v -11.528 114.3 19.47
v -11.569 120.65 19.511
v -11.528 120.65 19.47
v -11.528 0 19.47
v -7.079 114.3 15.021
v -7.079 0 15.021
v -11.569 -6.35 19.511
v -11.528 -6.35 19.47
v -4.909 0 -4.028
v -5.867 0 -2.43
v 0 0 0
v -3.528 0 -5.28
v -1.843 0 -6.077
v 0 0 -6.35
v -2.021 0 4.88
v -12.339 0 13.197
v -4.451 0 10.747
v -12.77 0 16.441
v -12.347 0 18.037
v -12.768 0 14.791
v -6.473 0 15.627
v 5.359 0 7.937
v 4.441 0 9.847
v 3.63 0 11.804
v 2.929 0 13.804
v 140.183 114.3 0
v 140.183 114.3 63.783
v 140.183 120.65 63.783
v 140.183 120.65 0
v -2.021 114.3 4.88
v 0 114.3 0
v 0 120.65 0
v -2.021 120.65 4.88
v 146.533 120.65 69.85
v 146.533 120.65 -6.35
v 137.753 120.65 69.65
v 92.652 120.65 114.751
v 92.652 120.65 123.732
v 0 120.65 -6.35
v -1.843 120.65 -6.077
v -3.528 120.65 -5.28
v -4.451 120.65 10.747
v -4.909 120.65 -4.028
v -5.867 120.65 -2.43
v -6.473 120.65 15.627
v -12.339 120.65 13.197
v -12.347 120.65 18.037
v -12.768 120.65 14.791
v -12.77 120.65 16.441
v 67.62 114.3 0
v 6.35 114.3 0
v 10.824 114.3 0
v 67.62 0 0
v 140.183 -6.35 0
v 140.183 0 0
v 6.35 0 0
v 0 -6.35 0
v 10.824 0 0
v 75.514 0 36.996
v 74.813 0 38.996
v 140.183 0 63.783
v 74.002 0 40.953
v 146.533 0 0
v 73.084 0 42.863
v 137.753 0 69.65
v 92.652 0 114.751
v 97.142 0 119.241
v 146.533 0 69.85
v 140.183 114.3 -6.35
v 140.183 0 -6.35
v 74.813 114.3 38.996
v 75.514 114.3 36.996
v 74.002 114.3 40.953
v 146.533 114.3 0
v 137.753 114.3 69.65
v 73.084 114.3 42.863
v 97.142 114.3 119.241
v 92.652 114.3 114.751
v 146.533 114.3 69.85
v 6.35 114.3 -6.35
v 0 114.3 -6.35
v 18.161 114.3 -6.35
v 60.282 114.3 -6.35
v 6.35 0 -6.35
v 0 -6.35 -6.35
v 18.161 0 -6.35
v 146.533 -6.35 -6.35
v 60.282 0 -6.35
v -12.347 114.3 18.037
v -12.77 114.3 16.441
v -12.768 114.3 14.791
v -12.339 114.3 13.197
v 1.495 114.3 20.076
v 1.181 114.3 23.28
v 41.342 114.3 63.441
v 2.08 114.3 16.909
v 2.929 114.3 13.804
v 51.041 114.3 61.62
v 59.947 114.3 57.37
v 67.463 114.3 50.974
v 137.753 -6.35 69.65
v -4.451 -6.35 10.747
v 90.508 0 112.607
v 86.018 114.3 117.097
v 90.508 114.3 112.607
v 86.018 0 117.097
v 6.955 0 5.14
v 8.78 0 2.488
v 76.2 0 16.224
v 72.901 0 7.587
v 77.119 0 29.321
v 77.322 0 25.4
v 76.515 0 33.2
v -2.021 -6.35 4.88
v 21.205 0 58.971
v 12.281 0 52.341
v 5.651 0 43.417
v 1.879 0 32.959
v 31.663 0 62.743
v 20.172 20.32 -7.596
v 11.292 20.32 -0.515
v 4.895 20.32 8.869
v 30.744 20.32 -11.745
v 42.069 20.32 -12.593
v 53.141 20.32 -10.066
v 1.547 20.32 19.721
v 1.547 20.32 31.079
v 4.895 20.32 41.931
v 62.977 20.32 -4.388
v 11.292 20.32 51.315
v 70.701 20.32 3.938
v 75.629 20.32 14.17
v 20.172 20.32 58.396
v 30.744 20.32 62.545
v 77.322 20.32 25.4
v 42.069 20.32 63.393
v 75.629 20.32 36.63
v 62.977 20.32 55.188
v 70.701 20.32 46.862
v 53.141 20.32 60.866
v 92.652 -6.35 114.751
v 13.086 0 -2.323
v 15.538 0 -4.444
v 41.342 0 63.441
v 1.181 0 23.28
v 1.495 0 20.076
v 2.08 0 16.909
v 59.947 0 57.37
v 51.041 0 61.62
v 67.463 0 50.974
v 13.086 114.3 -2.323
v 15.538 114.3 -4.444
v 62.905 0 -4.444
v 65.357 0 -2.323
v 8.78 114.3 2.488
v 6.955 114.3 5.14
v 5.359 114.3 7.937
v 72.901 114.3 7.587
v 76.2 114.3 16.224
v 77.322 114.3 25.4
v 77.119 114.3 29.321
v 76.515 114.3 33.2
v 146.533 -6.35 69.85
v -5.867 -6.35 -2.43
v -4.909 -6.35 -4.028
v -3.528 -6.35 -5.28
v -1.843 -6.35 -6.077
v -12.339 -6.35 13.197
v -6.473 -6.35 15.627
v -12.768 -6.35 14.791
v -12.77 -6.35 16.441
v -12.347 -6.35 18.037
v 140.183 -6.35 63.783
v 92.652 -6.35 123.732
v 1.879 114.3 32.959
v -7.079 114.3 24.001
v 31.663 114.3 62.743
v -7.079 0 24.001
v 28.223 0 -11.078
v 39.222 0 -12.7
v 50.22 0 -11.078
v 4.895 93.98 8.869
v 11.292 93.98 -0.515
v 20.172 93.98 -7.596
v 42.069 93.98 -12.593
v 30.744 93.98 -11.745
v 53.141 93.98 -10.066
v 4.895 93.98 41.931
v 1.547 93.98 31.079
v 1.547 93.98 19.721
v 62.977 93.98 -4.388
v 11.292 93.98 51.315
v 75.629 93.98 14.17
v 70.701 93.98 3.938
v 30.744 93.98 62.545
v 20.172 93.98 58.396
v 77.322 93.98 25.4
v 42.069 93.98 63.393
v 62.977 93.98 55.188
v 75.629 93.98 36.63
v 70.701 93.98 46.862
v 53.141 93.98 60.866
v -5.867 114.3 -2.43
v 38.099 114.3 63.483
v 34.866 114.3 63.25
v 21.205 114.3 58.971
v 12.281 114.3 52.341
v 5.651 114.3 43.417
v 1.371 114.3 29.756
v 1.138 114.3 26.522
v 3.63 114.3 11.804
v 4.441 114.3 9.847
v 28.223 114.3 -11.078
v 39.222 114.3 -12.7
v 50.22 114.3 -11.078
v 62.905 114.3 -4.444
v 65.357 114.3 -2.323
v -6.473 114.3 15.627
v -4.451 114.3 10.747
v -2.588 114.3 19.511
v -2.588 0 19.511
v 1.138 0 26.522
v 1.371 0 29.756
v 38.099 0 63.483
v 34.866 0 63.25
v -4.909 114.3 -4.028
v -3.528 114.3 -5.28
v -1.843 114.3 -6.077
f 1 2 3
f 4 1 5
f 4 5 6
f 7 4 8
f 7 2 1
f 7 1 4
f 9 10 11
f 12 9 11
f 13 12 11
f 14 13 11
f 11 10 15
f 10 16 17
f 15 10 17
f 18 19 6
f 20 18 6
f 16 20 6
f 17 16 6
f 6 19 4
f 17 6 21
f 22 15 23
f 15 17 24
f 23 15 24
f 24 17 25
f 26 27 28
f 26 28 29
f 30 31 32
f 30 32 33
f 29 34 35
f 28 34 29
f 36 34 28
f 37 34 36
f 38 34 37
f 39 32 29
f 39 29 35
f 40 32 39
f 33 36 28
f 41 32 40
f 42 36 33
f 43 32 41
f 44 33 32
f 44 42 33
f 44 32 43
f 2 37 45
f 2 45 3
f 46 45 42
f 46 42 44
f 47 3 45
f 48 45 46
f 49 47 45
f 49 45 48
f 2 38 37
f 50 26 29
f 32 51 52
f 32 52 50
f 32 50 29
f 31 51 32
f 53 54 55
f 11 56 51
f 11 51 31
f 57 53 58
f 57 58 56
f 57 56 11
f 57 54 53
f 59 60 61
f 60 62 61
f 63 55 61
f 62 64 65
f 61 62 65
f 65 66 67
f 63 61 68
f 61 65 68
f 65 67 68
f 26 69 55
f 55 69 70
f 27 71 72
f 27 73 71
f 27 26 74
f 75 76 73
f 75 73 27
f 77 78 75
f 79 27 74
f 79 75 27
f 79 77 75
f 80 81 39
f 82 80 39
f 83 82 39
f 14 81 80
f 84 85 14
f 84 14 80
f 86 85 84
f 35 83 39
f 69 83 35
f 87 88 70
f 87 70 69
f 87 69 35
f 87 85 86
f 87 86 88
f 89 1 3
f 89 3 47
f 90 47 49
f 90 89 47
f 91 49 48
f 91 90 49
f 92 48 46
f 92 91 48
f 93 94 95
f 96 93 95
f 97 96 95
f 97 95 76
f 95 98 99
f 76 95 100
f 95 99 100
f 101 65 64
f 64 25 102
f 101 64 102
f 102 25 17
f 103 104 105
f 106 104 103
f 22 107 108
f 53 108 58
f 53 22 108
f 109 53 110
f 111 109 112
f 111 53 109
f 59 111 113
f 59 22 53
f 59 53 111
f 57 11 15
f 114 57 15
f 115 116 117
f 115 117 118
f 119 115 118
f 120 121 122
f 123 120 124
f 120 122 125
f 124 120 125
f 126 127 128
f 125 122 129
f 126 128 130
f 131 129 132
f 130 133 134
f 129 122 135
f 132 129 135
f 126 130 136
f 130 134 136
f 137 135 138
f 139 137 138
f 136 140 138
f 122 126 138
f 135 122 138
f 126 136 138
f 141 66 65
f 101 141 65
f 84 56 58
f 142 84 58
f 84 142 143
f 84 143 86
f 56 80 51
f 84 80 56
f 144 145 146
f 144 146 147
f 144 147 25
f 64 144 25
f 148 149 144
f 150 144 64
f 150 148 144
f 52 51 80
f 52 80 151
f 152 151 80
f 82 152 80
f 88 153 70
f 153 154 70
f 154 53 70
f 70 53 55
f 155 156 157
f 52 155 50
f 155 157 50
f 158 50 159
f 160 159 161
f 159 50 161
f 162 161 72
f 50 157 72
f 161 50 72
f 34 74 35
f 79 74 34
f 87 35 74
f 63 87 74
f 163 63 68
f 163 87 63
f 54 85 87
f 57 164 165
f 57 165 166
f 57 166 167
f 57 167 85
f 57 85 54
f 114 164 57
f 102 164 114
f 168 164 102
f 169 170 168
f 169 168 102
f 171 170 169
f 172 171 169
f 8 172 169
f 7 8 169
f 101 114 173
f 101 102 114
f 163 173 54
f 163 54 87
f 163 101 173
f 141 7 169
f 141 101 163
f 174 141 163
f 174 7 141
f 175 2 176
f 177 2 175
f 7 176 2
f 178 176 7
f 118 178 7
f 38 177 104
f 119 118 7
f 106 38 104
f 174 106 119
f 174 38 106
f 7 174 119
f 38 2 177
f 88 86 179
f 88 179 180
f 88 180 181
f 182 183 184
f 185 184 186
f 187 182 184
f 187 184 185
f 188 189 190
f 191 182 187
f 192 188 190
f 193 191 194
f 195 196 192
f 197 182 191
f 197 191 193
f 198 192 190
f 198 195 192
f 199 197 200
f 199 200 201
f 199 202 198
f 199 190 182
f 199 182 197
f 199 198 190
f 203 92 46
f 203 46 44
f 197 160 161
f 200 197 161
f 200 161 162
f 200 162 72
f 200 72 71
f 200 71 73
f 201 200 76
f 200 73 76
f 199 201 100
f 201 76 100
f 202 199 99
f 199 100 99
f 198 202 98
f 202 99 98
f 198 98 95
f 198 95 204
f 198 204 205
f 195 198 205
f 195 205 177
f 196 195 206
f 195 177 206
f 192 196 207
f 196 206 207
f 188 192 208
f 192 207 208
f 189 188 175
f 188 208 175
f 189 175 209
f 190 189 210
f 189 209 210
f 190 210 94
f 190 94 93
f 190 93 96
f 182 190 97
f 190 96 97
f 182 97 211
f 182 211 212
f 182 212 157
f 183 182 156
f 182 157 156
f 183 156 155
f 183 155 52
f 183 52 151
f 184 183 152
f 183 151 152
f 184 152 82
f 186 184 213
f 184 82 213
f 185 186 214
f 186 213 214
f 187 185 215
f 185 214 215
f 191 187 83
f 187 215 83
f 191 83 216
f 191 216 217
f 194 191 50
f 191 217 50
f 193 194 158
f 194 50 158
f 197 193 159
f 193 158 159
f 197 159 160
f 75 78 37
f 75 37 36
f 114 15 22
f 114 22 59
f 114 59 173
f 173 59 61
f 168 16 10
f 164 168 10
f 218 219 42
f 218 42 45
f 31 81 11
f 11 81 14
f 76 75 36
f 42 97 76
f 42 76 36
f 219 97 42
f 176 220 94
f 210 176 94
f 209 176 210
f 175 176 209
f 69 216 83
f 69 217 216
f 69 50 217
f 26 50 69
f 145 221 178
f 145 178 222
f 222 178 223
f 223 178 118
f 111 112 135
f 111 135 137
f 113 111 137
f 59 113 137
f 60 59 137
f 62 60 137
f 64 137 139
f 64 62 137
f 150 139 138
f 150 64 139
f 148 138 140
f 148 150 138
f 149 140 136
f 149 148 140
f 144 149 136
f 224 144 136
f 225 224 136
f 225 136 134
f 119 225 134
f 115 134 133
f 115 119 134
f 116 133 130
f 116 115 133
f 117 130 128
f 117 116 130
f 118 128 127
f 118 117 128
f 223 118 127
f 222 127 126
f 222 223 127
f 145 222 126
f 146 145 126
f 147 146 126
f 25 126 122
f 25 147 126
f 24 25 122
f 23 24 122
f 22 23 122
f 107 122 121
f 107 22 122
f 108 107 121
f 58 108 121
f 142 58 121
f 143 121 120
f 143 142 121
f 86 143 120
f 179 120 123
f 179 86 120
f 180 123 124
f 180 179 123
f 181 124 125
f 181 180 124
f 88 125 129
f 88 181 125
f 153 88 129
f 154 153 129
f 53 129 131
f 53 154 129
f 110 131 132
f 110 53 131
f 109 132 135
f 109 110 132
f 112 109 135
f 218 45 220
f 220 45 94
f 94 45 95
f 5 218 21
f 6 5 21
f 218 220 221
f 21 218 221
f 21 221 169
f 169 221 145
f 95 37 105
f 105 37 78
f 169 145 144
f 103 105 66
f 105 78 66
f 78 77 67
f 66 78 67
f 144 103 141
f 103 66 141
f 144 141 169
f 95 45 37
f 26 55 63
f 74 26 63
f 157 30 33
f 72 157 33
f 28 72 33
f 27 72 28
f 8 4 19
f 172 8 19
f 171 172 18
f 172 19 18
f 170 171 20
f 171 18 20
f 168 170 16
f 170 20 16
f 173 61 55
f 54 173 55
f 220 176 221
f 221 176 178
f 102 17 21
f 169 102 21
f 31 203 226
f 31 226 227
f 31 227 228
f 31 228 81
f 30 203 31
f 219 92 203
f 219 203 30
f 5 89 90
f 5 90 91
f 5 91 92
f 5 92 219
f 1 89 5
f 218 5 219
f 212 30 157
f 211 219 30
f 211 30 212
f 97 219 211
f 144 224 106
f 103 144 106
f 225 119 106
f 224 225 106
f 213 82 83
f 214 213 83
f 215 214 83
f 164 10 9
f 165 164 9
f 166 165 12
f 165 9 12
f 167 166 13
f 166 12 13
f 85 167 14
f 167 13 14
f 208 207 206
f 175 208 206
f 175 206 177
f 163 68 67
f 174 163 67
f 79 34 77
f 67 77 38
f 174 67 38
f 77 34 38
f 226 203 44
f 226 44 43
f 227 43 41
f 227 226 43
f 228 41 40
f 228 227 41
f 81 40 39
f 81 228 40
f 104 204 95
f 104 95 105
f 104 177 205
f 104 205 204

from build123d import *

# Parameters (mm, degrees)
F1_DEPTH = 6.35
F4_W     = 127
F4_H     = 147.3902405336
F4_W_2   = 114.3
F4_H_2   = 131.6580059171
F5_DEPTH = 6.35
F6_W     = 146.5334397942
F6_H     = 127
F6_W_2   = 133.8334397942
F6_H_2   = 114.3
F7_DEPTH = 6.35
F8_R     = 38.1
F9_DEPTH = 20.32


with BuildPart() as f1:
    # F0 (on Front) → F1 (new body)
    with BuildSketch(Plane.XZ):
        with BuildLine():
            Line((146.5334397942, -6.35), (146.5334397942, 69.85))
            Line((146.5334397942, 69.85), (92.6519030678, 123.7315367264))
            Line((92.6519030678, 123.7315367264), (-10.9628858813, 20.1167477774))
            ThreePointArc((-10.9628858813, 20.1167477774), (-12.7007443513, 16.8654432616), (-12.3393928522, 13.1965799213))
            Line((-12.3393928522, 13.1965799213), (-5.8666350314, -2.4300397955))
            ThreePointArc((-5.8666350314, -2.4300397955), (-3.5278709797, -5.2798320381), (0, -6.35))
            Line((0, -6.35), (146.5334397942, -6.35))
        make_face()
        Polygon((140.1834397942, 0), (0, 0), (-2.0213590126, 4.8799923427), (140.1834397942, 63.783148643), align=None, mode=Mode.SUBTRACT)
        Polygon((-4.4513988081, 10.7466273741), (-6.4727578208, 15.6266197168), (92.6519030678, 114.7512806053), (137.7533999987, 69.6497836744), align=None, mode=Mode.SUBTRACT)
    extrude(amount=F1_DEPTH)


with BuildPart() as f3_1:
    # F3: instance of F1
    add(f1.part.mirror(Plane.XZ.offset(-57.15)))


with BuildPart() as f1_1:
    add(f1.part)

    add(f3_1.part)  # F5 merges F3_1
    # F4 (on face) → F5 (join)
    with BuildSketch(Plane(origin=(-15.5398168293, 0, 15.5398168293), x_dir=(0, -1, 0), z_dir=(-0.7071067812, 0, 0.7071067812))):
        with Locations((-57.15, 79.3110773481)):
            Rectangle(F4_W, F4_H)
        with Locations((-57.15, 77.7949600399)):
            Rectangle(F4_W_2, F4_H_2, mode=Mode.SUBTRACT)
        Polygon((6.35, 153.0061976149), (-114.3, 153.0061976149), (-114.3, 143.6239629984), (0, 143.6239629984), (0, 11.9659570813), (-114.3, 11.9659570813), (-114.3, 6.4727578208), (-120.65, 6.4727578208), (-120.65, 5.6159570813), (6.35, 5.6159570813), align=None)
    extrude(amount=-F5_DEPTH)

    # F6 (on face) → F7 (join)
    with BuildSketch(Plane(origin=(0, 0, -6.35), x_dir=(1, 0, 0), z_dir=(0, 0, -1))):
        with Locations((73.2667198971, -57.15)):
            Rectangle(F6_W, F6_H)
        with Locations((73.2667198971, -57.15)):
            Rectangle(F6_W_2, F6_H_2, mode=Mode.SUBTRACT)
    extrude(amount=-F7_DEPTH)

    # F8 (on face) → F9 (join)
    with BuildSketch(Plane.XZ.offset(-114.3)):
        with Locations((39.2216469467, 25.4)):
            Circle(F8_R)
    extrude(amount=F9_DEPTH)

    # F10: F1 across plane


with BuildPart() as f1_2:
    add(f1_1.part)
    add(f1_1.part.mirror(Plane.XZ.offset(-57.15)))


solid = f1_2.part
